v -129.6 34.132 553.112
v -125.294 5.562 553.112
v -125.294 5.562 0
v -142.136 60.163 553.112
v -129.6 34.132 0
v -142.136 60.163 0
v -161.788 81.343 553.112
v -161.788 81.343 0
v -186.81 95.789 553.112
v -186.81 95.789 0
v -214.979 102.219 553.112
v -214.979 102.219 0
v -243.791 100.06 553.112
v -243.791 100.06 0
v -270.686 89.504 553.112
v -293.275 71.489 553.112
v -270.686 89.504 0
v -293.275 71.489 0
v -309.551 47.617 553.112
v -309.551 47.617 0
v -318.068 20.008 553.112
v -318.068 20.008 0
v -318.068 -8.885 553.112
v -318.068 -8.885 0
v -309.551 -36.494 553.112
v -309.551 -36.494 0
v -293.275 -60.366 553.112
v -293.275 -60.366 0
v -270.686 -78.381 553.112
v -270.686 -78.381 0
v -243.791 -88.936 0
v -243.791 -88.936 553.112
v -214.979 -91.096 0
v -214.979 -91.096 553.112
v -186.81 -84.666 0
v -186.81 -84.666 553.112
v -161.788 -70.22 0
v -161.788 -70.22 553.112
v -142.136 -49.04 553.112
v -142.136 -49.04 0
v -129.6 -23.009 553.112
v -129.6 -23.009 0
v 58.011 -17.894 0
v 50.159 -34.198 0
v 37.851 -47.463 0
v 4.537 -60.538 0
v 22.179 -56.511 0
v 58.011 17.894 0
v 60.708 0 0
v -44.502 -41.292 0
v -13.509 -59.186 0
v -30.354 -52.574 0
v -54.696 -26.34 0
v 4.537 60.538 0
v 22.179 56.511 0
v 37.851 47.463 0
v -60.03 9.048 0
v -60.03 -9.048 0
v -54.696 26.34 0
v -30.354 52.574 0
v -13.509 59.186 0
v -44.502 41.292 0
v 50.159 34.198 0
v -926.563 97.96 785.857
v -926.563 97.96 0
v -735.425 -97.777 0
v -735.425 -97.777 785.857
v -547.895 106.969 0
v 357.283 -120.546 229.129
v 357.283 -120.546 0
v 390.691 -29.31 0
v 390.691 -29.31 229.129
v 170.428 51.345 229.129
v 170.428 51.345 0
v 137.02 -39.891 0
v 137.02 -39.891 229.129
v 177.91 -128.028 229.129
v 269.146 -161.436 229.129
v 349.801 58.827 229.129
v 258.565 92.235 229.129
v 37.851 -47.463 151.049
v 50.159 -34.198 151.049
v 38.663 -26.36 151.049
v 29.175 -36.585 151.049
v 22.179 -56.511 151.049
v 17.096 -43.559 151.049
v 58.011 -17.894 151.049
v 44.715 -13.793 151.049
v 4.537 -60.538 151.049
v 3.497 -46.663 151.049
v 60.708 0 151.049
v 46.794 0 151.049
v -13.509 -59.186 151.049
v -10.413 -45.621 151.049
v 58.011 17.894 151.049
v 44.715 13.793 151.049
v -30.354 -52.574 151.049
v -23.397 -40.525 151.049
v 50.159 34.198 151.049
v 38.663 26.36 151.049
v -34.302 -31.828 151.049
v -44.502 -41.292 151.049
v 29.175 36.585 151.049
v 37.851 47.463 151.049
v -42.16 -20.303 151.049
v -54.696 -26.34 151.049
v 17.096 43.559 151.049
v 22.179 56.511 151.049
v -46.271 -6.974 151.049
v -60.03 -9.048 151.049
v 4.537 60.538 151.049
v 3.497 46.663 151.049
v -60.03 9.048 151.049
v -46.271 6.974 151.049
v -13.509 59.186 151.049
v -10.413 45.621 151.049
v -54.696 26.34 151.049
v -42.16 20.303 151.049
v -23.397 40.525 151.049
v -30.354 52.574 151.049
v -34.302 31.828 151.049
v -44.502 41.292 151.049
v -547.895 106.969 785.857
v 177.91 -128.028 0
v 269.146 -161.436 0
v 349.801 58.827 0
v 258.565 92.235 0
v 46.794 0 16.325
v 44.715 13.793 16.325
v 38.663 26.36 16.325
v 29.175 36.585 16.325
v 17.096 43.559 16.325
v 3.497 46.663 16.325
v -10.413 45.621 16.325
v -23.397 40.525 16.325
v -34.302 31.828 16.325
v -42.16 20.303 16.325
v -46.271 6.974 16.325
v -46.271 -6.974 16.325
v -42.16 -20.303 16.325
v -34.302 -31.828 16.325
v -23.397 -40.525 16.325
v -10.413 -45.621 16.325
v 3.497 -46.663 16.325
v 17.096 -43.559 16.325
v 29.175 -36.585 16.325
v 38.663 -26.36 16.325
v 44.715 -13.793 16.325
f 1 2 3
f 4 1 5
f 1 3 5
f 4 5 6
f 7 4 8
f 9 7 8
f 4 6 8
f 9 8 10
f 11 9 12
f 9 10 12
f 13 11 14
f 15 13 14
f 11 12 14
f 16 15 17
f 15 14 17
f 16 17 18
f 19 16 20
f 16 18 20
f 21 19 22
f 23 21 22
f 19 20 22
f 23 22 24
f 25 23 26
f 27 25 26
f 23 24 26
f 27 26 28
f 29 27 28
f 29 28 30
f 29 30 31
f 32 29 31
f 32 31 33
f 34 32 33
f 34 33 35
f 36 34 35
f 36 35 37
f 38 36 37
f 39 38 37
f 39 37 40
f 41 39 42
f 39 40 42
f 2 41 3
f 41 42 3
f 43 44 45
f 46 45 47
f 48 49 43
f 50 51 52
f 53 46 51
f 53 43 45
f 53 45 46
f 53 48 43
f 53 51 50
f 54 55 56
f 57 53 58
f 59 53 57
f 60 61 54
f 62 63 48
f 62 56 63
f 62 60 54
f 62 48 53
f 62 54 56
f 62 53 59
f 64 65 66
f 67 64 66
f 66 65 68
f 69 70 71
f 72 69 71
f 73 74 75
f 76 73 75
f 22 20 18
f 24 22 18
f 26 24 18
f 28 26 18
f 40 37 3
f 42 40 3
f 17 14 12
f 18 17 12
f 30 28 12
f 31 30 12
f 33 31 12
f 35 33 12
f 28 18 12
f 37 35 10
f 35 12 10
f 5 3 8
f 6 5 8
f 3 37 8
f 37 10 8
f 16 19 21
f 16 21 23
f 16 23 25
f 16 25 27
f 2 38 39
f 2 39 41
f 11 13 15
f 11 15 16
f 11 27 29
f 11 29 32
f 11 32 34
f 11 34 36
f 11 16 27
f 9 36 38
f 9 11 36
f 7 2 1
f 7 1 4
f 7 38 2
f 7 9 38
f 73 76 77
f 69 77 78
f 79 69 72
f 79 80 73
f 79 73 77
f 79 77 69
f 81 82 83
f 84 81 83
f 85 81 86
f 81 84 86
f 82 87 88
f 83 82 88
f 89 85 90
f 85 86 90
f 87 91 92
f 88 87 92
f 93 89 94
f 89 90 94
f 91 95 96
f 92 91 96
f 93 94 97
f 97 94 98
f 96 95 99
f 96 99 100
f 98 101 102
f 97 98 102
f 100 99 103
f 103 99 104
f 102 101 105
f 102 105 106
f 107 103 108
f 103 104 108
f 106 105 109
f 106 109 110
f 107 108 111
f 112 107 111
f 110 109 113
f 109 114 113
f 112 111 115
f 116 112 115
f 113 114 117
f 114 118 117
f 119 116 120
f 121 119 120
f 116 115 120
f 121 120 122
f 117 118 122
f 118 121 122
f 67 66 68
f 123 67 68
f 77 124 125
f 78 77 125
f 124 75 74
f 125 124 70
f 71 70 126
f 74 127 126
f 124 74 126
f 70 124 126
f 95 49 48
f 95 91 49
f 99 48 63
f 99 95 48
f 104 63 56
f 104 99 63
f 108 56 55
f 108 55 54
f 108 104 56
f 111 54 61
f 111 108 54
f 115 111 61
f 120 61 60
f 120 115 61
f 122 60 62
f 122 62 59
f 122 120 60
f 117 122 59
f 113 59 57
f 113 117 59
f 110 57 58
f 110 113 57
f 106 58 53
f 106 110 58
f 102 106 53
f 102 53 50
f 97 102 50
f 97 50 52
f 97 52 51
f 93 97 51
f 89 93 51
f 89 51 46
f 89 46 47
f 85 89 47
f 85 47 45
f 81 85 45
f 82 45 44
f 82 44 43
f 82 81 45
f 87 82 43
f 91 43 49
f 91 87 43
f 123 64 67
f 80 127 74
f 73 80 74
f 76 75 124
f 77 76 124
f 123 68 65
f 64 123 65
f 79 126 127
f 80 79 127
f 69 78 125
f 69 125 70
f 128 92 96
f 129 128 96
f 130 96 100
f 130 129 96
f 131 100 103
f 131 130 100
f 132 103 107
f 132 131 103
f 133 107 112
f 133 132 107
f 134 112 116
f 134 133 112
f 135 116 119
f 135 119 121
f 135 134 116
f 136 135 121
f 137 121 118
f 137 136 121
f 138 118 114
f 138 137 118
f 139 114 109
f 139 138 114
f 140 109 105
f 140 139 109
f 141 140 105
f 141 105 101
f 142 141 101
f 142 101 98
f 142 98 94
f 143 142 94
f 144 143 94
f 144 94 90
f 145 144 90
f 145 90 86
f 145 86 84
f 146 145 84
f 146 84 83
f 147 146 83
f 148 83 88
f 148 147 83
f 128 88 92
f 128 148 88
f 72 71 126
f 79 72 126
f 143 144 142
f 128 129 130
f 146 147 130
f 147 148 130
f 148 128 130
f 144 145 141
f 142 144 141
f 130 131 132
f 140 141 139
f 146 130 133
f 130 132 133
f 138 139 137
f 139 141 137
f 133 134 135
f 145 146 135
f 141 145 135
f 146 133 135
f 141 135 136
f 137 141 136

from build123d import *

# Parameters (mm, degrees)
F0_W     = 13.913841
F0_H     = 134.724088
F0_H_2   = 16.325258
F0_W_2   = 46.793818
F2_DEPTH = 229.129193
F3_R     = 96.928196
F4_DEPTH = 553.112326
F7_DEPTH = 785.856903


with BuildPart() as f1:
    # F0 (on Front) → F1 (revolve)
    with BuildSketch(Plane.XZ):
        with Locations((53.750738, 83.687302)):
            Rectangle(F0_W, F0_H)
        with Locations((53.750738, 8.162629)):
            Rectangle(F0_W, F0_H_2)
        with Locations((23.396909, 8.162629)):
            Rectangle(F0_W_2, F0_H_2)
    revolve(axis=Axis((0, 0, 96.930586), (0, 0, 1)))


with BuildPart() as f2:
    # F6 (on Top) → F2 (new body)
    with BuildSketch(Plane.XY):
        Polygon((357.282943, -120.545885), (390.691215, -29.309863), (349.80082, 58.826963), (258.564798, 92.235235), (170.427972, 51.34484), (137.0197, -39.891182), (177.910095, -128.028008), (269.146117, -161.43628), align=None)
    extrude(amount=F2_DEPTH)


with BuildPart() as f4:
    # F3 (on Top) → F4 (new body)
    with BuildSketch(Plane.XY):
        with Locations((-222.22206, 5.56156)):
            Circle(F3_R)
    extrude(amount=F4_DEPTH)


with BuildPart() as f7:
    # F5 (on Top) → F7 (new body)
    with BuildSketch(Plane.XY):
        Polygon((-926.562548, 97.959578), (-735.425472, -97.776711), (-547.895193, 106.969297), align=None)
    extrude(amount=F7_DEPTH)


solid = Compound([f1.part, f2.part, f4.part, f7.part])
